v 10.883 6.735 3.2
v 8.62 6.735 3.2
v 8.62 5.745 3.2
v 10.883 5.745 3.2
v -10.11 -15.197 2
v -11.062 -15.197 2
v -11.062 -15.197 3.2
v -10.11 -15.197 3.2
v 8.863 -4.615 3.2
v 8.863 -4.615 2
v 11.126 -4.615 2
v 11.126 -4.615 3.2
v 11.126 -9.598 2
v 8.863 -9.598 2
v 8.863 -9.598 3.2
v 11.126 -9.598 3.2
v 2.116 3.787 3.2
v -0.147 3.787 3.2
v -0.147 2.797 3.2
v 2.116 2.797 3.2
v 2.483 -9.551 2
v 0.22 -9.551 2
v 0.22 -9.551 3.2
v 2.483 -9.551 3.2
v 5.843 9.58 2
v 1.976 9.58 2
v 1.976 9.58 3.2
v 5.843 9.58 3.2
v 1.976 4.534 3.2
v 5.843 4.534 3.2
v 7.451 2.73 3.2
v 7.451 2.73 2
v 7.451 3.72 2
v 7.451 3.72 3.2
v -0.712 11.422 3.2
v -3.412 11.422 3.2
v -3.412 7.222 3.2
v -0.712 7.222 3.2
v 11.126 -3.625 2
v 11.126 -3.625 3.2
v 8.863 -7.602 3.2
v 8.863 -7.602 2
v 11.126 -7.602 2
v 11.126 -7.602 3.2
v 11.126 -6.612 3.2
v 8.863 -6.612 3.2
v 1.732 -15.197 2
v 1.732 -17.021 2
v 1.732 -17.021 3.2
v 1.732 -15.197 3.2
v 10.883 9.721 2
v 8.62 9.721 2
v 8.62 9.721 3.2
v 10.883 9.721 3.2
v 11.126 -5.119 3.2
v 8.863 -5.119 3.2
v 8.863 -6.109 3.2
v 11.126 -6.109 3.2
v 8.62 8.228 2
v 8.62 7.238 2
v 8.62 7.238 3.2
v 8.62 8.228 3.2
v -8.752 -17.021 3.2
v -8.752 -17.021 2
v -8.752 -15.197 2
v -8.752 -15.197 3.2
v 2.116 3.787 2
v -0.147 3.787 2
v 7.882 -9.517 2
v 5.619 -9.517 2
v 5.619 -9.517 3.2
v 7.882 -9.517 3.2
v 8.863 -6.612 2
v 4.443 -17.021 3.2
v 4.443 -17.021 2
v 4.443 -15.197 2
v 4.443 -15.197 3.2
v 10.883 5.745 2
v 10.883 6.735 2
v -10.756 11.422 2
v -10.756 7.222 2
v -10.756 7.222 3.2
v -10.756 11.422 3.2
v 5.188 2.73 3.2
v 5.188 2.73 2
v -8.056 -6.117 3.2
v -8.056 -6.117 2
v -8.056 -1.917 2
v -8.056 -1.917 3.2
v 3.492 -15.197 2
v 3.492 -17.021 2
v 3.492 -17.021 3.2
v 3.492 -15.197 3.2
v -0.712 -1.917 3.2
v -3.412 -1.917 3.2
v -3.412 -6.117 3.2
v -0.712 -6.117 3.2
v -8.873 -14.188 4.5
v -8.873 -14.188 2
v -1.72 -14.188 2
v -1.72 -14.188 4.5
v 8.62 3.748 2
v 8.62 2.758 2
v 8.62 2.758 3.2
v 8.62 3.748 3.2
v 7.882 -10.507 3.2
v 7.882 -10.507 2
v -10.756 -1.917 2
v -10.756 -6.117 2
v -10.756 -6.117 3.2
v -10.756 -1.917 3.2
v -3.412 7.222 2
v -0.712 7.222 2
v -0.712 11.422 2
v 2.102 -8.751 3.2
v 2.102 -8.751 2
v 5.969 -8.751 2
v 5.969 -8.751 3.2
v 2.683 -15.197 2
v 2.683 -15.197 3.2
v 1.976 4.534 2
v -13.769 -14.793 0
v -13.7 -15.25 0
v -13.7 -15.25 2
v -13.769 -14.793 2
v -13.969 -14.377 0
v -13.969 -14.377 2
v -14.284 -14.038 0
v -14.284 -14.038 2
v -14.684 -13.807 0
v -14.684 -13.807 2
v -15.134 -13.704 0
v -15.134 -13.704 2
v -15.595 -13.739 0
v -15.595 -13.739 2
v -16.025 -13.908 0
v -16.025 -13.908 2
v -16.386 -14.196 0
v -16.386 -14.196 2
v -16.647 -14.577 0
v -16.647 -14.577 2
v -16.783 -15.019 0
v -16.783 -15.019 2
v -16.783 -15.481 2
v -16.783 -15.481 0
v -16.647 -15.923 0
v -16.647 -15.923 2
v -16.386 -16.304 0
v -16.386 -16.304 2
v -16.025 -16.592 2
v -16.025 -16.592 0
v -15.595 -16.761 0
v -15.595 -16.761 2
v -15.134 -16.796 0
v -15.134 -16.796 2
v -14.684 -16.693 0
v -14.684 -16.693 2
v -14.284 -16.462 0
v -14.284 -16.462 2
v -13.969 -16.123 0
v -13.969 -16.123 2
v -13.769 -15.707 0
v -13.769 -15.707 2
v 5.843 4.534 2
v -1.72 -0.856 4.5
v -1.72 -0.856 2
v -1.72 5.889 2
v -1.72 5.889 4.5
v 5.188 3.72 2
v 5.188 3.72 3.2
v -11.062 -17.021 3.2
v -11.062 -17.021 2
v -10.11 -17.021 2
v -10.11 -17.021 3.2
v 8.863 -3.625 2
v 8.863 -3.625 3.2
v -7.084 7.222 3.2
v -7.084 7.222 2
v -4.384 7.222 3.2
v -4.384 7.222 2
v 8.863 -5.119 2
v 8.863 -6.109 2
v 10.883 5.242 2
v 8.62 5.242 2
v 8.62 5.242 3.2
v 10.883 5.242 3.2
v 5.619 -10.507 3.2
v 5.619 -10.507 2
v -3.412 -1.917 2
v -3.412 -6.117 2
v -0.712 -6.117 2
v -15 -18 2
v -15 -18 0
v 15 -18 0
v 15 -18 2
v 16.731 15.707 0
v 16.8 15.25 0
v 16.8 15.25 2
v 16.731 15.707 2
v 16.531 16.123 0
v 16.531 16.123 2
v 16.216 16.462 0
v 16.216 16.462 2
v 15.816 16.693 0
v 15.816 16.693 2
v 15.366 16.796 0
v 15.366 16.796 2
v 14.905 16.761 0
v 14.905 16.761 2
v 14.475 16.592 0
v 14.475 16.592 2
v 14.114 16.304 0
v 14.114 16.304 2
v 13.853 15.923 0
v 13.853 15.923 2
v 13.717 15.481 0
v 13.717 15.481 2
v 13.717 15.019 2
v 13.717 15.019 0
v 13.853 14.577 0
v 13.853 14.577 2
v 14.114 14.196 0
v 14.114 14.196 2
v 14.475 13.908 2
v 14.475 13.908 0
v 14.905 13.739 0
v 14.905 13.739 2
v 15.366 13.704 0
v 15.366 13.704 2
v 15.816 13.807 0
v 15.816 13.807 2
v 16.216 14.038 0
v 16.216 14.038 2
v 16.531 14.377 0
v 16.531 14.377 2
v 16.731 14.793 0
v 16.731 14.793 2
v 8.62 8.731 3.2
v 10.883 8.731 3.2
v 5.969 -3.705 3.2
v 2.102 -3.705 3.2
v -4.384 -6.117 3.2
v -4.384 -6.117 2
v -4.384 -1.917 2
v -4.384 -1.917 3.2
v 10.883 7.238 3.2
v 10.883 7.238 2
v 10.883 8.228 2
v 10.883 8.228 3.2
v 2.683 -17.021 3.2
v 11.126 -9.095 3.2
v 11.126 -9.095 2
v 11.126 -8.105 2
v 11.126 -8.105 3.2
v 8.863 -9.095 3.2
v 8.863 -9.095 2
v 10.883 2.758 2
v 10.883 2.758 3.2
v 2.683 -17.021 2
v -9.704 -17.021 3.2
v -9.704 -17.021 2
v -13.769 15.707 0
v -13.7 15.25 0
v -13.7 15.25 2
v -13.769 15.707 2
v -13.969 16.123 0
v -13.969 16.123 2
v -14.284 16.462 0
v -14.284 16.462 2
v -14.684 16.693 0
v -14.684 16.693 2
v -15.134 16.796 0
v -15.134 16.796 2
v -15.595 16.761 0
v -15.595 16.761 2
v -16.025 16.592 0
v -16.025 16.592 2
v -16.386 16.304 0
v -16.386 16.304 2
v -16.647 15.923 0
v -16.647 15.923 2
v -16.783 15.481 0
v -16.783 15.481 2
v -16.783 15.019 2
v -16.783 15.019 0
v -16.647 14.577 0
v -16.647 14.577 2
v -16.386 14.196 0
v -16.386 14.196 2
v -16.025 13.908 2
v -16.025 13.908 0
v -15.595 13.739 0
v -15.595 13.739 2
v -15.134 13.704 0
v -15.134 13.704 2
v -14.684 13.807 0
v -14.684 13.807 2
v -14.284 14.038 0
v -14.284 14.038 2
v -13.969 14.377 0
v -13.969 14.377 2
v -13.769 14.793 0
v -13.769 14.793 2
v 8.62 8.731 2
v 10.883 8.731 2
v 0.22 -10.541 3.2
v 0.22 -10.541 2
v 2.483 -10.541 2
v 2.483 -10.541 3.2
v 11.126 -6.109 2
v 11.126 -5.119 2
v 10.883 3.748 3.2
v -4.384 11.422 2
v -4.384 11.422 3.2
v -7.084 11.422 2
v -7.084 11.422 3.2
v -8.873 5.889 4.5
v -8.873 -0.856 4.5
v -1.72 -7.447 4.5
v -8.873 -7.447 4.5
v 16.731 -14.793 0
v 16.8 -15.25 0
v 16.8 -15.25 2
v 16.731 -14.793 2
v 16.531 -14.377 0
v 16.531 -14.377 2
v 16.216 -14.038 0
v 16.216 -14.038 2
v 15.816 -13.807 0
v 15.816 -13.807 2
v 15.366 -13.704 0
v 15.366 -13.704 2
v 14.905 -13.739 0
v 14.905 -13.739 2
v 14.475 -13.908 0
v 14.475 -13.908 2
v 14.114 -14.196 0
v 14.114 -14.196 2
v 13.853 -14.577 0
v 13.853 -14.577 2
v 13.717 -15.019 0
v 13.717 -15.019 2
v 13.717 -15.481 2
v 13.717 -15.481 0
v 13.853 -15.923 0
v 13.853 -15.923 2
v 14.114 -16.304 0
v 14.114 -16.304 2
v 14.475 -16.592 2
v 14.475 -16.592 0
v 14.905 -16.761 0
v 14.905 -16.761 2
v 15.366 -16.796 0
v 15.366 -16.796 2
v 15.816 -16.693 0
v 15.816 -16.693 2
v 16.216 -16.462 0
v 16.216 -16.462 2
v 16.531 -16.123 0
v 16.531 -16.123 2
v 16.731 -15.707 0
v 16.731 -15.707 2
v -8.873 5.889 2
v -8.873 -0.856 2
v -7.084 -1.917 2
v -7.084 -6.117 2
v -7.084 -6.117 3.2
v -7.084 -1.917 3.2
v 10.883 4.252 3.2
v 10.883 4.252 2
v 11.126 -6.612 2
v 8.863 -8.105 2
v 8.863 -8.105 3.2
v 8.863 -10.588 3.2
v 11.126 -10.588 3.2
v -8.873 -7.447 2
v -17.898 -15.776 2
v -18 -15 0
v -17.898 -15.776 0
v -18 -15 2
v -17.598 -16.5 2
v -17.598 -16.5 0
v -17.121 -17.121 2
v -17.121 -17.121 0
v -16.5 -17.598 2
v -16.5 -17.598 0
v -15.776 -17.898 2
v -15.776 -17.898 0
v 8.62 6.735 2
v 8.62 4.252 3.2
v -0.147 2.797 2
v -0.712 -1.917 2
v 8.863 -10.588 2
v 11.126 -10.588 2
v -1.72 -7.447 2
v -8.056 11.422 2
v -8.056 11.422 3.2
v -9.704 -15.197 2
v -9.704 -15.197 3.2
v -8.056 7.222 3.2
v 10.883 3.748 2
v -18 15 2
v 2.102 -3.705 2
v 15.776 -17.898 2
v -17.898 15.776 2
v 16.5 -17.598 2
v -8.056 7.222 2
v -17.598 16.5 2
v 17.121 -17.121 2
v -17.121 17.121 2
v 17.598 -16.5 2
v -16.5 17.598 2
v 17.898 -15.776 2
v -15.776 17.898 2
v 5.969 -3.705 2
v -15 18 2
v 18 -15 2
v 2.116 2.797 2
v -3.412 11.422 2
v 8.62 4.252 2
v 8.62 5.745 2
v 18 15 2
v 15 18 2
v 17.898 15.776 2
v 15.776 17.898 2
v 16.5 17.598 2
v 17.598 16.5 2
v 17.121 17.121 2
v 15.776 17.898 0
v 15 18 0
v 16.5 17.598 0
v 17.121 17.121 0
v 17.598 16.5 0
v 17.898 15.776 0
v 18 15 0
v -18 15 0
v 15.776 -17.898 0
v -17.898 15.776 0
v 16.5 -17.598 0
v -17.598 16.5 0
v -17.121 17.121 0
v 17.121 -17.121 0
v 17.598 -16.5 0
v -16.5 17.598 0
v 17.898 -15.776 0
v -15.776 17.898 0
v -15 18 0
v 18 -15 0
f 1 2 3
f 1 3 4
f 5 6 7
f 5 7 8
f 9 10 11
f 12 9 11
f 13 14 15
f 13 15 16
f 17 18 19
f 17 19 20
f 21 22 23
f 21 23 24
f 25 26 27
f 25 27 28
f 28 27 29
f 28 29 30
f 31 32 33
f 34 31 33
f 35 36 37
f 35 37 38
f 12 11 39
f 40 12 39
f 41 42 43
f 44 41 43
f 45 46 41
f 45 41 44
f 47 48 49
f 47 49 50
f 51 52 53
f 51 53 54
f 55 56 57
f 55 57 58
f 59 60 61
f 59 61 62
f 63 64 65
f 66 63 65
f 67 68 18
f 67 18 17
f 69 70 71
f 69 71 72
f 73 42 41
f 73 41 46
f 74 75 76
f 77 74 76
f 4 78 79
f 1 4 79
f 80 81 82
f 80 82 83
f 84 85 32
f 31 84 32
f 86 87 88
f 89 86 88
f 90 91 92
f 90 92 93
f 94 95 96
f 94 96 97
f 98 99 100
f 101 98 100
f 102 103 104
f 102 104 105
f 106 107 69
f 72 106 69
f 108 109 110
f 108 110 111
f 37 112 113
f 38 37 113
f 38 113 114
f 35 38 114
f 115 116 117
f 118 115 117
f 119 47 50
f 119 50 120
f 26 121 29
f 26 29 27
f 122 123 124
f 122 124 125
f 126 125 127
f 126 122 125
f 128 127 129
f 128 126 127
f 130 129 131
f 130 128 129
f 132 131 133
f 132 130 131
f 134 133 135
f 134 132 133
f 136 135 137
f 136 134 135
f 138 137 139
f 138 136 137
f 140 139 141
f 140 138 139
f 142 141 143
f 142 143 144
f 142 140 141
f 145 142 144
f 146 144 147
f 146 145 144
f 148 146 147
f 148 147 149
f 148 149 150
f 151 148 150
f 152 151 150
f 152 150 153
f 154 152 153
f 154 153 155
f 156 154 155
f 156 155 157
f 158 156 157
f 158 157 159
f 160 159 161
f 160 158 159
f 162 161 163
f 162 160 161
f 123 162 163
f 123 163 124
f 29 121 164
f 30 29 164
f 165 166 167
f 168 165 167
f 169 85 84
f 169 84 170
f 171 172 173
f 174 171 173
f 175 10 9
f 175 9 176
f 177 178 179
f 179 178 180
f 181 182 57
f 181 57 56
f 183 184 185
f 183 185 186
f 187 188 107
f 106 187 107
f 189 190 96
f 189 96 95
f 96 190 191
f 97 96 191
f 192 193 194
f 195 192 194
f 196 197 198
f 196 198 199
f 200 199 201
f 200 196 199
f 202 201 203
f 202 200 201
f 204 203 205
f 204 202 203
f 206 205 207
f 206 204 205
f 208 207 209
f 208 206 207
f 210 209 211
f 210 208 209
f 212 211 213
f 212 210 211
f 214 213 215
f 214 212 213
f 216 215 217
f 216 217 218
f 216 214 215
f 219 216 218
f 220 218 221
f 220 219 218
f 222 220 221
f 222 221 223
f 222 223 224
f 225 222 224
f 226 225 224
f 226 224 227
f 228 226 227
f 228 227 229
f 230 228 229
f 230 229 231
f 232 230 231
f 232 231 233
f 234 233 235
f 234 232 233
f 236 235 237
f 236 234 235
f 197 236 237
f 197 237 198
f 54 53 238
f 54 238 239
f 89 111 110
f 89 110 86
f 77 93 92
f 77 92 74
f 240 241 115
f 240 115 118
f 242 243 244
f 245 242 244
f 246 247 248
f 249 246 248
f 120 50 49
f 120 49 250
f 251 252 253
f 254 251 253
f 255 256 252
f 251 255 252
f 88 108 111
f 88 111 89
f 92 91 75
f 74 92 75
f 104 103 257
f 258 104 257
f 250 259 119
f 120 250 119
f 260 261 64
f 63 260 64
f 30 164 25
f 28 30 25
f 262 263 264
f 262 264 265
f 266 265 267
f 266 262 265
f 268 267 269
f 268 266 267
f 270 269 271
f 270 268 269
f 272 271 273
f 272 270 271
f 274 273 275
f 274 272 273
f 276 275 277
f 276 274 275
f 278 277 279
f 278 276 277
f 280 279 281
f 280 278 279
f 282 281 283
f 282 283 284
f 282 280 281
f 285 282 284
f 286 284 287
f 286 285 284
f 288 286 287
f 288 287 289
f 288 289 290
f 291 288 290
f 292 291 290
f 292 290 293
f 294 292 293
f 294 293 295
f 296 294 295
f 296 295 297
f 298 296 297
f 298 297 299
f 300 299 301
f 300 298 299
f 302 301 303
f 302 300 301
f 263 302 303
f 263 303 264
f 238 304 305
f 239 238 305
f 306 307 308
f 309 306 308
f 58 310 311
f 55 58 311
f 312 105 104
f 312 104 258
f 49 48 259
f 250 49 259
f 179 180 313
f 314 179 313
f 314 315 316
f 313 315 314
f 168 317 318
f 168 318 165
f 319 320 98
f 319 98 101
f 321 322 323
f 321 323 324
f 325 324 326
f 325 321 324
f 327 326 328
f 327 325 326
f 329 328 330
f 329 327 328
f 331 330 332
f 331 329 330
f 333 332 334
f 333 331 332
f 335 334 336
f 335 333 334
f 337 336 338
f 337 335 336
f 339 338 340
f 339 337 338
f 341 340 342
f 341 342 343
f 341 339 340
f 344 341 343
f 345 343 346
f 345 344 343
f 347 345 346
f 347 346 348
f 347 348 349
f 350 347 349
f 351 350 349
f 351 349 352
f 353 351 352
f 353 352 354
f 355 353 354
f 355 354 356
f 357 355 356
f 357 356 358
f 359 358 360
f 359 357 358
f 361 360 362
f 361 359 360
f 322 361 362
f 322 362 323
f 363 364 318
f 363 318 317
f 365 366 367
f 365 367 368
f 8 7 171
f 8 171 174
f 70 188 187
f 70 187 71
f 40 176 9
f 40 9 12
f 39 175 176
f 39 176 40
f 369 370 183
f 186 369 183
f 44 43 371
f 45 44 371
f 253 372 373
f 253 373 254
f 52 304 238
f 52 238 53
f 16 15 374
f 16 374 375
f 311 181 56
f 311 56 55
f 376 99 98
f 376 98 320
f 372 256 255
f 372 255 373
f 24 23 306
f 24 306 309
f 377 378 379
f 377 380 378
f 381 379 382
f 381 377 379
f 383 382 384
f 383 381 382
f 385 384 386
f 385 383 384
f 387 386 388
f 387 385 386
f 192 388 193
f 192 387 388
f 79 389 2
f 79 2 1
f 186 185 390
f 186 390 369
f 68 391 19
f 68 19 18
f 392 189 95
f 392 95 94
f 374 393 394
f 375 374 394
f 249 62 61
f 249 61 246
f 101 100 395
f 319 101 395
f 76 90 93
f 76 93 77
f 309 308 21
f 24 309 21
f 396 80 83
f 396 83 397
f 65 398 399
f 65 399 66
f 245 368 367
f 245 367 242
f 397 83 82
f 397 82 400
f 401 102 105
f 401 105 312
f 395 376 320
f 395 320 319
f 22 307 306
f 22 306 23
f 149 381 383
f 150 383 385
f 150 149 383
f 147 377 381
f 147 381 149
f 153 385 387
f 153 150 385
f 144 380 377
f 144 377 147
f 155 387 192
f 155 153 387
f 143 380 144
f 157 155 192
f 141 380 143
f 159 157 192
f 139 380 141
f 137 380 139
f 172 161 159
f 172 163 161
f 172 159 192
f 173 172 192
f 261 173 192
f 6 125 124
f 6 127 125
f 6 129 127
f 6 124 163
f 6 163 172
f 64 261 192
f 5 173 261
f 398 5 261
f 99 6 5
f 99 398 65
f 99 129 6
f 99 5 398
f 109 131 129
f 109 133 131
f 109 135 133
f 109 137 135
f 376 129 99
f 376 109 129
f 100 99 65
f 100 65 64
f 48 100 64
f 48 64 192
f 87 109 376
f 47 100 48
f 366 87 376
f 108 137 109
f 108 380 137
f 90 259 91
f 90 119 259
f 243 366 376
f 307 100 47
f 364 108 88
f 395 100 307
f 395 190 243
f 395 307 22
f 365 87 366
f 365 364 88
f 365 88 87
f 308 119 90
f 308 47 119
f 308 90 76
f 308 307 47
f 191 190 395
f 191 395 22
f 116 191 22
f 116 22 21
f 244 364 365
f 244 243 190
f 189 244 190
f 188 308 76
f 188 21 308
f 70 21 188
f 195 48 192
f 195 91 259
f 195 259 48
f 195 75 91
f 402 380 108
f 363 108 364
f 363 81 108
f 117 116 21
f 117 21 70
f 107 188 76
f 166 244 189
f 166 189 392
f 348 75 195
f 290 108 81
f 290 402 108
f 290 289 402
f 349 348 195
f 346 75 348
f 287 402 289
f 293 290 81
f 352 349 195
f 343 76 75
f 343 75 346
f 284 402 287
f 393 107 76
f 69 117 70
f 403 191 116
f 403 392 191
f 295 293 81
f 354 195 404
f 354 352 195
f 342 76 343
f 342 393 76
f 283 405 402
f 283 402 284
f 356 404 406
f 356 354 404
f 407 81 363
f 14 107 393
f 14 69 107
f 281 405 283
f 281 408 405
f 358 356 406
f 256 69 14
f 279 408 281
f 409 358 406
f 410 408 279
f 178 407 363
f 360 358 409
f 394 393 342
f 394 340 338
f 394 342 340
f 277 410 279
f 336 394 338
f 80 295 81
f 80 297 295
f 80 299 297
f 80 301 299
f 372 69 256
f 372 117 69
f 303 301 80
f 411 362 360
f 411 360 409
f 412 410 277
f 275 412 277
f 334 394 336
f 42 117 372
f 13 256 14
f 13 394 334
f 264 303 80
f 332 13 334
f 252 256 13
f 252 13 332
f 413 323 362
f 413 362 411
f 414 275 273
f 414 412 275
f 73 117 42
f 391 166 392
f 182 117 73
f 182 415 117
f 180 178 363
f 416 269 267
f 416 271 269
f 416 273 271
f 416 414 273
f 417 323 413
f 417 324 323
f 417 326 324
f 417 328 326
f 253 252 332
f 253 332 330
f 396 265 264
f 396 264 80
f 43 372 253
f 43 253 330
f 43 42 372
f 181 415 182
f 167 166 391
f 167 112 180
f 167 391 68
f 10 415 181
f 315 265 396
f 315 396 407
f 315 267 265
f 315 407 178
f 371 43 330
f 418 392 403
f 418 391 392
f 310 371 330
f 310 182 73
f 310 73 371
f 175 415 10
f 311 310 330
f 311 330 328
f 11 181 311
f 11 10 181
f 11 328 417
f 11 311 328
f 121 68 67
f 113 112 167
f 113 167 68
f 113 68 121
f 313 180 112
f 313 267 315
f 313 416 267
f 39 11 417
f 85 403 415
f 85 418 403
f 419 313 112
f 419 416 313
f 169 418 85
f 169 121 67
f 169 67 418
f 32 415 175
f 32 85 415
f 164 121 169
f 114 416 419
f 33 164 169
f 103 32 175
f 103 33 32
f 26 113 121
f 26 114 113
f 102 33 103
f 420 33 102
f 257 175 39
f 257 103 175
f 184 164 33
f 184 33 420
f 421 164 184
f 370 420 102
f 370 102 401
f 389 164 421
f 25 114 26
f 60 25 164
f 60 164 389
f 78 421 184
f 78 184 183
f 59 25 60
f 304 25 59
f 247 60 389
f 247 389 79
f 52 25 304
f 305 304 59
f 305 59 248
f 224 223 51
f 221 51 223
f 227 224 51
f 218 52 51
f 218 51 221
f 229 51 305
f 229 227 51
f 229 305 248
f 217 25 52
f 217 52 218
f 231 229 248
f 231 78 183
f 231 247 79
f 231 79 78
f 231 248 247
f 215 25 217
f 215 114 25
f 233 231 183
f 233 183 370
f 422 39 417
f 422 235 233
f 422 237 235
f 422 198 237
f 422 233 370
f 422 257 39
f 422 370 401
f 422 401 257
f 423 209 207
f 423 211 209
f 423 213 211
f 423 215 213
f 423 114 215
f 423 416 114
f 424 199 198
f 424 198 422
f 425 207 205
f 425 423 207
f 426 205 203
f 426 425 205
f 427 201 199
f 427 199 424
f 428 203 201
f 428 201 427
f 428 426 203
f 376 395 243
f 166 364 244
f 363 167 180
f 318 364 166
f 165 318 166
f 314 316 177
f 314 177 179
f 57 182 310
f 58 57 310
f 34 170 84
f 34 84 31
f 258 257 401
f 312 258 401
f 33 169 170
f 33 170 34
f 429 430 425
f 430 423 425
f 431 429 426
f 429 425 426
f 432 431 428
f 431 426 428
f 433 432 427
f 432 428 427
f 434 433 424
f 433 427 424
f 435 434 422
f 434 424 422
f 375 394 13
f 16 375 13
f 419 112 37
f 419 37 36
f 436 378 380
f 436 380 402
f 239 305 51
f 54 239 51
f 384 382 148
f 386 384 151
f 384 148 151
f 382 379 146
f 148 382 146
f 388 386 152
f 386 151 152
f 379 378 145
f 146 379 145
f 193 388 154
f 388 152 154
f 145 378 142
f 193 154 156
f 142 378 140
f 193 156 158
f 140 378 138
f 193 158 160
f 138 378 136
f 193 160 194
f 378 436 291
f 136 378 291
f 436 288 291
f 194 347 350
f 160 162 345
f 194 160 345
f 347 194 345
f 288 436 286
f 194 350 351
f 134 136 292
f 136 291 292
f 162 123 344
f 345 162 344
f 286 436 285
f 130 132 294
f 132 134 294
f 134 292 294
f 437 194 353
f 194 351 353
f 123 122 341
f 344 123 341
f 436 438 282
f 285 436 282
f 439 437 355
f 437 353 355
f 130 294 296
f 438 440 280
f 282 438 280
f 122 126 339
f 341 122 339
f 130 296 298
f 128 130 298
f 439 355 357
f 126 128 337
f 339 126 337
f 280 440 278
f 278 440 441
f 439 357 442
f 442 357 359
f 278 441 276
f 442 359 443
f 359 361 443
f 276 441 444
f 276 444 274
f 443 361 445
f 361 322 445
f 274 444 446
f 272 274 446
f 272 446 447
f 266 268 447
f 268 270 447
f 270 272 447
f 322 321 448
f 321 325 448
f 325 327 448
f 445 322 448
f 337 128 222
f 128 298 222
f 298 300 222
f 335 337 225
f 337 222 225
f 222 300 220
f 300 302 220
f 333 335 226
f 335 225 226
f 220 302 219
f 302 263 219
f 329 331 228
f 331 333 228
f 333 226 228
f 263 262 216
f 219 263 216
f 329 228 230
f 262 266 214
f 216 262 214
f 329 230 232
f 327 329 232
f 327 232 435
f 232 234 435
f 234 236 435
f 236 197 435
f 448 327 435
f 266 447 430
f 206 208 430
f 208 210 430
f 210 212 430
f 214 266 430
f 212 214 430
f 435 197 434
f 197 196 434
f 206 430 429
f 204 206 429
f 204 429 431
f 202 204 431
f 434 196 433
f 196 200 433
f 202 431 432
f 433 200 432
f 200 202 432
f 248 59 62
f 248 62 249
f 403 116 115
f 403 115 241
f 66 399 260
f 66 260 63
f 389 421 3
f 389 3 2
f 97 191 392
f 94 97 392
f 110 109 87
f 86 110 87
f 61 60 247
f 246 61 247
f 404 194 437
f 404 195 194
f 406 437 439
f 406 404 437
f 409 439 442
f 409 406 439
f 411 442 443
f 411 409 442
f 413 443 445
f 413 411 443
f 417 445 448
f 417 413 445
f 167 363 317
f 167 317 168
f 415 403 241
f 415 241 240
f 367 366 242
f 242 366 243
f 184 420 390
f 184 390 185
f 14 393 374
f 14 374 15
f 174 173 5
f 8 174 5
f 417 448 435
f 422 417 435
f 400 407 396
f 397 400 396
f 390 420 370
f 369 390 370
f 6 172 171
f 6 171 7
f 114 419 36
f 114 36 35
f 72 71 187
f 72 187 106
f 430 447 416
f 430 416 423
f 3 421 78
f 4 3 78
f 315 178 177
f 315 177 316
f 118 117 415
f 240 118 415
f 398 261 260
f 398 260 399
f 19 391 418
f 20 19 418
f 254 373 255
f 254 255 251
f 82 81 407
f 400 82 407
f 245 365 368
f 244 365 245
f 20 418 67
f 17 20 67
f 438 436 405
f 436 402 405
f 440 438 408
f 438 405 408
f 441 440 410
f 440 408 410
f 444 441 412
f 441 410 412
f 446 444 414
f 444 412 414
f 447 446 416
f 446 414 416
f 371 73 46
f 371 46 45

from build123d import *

# Parameters (mm, degrees)
F0_W     = 36
F0_H     = 36
F0_R     = 1.55
F1_DEPTH = 2
F2_W     = 2.7
F2_H     = 4.2
F2_W_2   = 3.866767
F2_H_2   = 5.045659
F2_W_3   = 2.263
F2_H_3   = 0.99
F2_W_4   = 0.951673
F2_H_4   = 1.824041
F2_W_5   = 0.951672
F3_DEPTH = 1.2
F4_W     = 7.152574
F4_H     = 6.745152
F4_H_2   = 6.741168
F5_DEPTH = 2.5
F6_R     = 3


with BuildPart() as f1:
    # F0 (on Top) → F1 (new body)
    with BuildSketch(Plane.XY):
        Rectangle(F0_W, F0_H)
        with Locations((-15.25, -15.25)):
            Circle(F0_R, mode=Mode.SUBTRACT)
        with Locations((15.25, -15.25)):
            Circle(F0_R, mode=Mode.SUBTRACT)
        with Locations((-15.25, 15.25)):
            Circle(F0_R, mode=Mode.SUBTRACT)
        with Locations((15.25, 15.25)):
            Circle(F0_R, mode=Mode.SUBTRACT)
    extrude(amount=F1_DEPTH)

    # F2 (on face) → F3 (join)
    with BuildSketch(Plane.XY.offset(2)):
        with Locations((-9.406283, 9.322272)):
            Rectangle(F2_W, F2_H)
        with Locations((-9.406283, -4.017373)):
            Rectangle(F2_W, F2_H)
        with Locations((-5.734202, 9.322272)):
            Rectangle(F2_W, F2_H)
        with Locations((-5.734202, -4.017373)):
            Rectangle(F2_W, F2_H)
        with Locations((-2.062121, 9.322272)):
            Rectangle(F2_W, F2_H)
        with Locations((-2.062121, -4.017373)):
            Rectangle(F2_W, F2_H)
        with Locations((3.909136, 7.057227)):
            Rectangle(F2_W_2, F2_H_2)
        with Locations((4.035184, -6.228325)):
            Rectangle(F2_W_2, F2_H_2)
        with Locations((9.751364, 9.226358)):
            Rectangle(F2_W_3, F2_H_3)
        with Locations((9.751364, 7.733123)):
            Rectangle(F2_W_3, F2_H_3)
        with Locations((9.751364, 6.239888)):
            Rectangle(F2_W_3, F2_H_3)
        with Locations((9.751364, 4.746653)):
            Rectangle(F2_W_3, F2_H_3)
        with Locations((9.751364, 3.253418)):
            Rectangle(F2_W_3, F2_H_3)
        with Locations((9.994023, -4.120474)):
            Rectangle(F2_W_3, F2_H_3)
        with Locations((9.994023, -5.613709)):
            Rectangle(F2_W_3, F2_H_3)
        with Locations((9.994023, -7.106944)):
            Rectangle(F2_W_3, F2_H_3)
        with Locations((9.994023, -8.600179)):
            Rectangle(F2_W_3, F2_H_3)
        with Locations((9.994023, -10.093414)):
            Rectangle(F2_W_3, F2_H_3)
        with Locations((0.984356, 3.291811)):
            Rectangle(F2_W_3, F2_H_3)
        with Locations((6.319413, 3.225123)):
            Rectangle(F2_W_3, F2_H_3)
        with Locations((1.351141, -10.045832)):
            Rectangle(F2_W_3, F2_H_3)
        with Locations((6.750784, -10.012488)):
            Rectangle(F2_W_3, F2_H_3)
        with Locations((-10.585669, -16.109239)):
            Rectangle(F2_W_4, F2_H_4)
        with Locations((-9.228029, -16.109239)):
            Rectangle(F2_W_4, F2_H_4)
        with Locations((2.207651, -16.109239)):
            Rectangle(F2_W_4, F2_H_4)
        with Locations((3.96747, -16.109239)):
            Rectangle(F2_W_5, F2_H_4)
    extrude(amount=F3_DEPTH)

    # F4 (on face) → F5 (join)
    with BuildSketch(Plane.XY.offset(2)):
        with Locations((-5.296527, 2.516344)):
            Rectangle(F4_W, F4_H)
        with Locations((-5.296527, -10.817411)):
            Rectangle(F4_W, F4_H_2)
    extrude(amount=F5_DEPTH)

    # F6
    f6_edges = [f1.edges().sort_by_distance(p)[0] for p in [
        (-18, 18, 1),
        (-18, -18, 1),
        (18, -18, 1),
        (18, 18, 1),
    ]]
    fillet(f6_edges, radius=F6_R)


solid = f1.part
